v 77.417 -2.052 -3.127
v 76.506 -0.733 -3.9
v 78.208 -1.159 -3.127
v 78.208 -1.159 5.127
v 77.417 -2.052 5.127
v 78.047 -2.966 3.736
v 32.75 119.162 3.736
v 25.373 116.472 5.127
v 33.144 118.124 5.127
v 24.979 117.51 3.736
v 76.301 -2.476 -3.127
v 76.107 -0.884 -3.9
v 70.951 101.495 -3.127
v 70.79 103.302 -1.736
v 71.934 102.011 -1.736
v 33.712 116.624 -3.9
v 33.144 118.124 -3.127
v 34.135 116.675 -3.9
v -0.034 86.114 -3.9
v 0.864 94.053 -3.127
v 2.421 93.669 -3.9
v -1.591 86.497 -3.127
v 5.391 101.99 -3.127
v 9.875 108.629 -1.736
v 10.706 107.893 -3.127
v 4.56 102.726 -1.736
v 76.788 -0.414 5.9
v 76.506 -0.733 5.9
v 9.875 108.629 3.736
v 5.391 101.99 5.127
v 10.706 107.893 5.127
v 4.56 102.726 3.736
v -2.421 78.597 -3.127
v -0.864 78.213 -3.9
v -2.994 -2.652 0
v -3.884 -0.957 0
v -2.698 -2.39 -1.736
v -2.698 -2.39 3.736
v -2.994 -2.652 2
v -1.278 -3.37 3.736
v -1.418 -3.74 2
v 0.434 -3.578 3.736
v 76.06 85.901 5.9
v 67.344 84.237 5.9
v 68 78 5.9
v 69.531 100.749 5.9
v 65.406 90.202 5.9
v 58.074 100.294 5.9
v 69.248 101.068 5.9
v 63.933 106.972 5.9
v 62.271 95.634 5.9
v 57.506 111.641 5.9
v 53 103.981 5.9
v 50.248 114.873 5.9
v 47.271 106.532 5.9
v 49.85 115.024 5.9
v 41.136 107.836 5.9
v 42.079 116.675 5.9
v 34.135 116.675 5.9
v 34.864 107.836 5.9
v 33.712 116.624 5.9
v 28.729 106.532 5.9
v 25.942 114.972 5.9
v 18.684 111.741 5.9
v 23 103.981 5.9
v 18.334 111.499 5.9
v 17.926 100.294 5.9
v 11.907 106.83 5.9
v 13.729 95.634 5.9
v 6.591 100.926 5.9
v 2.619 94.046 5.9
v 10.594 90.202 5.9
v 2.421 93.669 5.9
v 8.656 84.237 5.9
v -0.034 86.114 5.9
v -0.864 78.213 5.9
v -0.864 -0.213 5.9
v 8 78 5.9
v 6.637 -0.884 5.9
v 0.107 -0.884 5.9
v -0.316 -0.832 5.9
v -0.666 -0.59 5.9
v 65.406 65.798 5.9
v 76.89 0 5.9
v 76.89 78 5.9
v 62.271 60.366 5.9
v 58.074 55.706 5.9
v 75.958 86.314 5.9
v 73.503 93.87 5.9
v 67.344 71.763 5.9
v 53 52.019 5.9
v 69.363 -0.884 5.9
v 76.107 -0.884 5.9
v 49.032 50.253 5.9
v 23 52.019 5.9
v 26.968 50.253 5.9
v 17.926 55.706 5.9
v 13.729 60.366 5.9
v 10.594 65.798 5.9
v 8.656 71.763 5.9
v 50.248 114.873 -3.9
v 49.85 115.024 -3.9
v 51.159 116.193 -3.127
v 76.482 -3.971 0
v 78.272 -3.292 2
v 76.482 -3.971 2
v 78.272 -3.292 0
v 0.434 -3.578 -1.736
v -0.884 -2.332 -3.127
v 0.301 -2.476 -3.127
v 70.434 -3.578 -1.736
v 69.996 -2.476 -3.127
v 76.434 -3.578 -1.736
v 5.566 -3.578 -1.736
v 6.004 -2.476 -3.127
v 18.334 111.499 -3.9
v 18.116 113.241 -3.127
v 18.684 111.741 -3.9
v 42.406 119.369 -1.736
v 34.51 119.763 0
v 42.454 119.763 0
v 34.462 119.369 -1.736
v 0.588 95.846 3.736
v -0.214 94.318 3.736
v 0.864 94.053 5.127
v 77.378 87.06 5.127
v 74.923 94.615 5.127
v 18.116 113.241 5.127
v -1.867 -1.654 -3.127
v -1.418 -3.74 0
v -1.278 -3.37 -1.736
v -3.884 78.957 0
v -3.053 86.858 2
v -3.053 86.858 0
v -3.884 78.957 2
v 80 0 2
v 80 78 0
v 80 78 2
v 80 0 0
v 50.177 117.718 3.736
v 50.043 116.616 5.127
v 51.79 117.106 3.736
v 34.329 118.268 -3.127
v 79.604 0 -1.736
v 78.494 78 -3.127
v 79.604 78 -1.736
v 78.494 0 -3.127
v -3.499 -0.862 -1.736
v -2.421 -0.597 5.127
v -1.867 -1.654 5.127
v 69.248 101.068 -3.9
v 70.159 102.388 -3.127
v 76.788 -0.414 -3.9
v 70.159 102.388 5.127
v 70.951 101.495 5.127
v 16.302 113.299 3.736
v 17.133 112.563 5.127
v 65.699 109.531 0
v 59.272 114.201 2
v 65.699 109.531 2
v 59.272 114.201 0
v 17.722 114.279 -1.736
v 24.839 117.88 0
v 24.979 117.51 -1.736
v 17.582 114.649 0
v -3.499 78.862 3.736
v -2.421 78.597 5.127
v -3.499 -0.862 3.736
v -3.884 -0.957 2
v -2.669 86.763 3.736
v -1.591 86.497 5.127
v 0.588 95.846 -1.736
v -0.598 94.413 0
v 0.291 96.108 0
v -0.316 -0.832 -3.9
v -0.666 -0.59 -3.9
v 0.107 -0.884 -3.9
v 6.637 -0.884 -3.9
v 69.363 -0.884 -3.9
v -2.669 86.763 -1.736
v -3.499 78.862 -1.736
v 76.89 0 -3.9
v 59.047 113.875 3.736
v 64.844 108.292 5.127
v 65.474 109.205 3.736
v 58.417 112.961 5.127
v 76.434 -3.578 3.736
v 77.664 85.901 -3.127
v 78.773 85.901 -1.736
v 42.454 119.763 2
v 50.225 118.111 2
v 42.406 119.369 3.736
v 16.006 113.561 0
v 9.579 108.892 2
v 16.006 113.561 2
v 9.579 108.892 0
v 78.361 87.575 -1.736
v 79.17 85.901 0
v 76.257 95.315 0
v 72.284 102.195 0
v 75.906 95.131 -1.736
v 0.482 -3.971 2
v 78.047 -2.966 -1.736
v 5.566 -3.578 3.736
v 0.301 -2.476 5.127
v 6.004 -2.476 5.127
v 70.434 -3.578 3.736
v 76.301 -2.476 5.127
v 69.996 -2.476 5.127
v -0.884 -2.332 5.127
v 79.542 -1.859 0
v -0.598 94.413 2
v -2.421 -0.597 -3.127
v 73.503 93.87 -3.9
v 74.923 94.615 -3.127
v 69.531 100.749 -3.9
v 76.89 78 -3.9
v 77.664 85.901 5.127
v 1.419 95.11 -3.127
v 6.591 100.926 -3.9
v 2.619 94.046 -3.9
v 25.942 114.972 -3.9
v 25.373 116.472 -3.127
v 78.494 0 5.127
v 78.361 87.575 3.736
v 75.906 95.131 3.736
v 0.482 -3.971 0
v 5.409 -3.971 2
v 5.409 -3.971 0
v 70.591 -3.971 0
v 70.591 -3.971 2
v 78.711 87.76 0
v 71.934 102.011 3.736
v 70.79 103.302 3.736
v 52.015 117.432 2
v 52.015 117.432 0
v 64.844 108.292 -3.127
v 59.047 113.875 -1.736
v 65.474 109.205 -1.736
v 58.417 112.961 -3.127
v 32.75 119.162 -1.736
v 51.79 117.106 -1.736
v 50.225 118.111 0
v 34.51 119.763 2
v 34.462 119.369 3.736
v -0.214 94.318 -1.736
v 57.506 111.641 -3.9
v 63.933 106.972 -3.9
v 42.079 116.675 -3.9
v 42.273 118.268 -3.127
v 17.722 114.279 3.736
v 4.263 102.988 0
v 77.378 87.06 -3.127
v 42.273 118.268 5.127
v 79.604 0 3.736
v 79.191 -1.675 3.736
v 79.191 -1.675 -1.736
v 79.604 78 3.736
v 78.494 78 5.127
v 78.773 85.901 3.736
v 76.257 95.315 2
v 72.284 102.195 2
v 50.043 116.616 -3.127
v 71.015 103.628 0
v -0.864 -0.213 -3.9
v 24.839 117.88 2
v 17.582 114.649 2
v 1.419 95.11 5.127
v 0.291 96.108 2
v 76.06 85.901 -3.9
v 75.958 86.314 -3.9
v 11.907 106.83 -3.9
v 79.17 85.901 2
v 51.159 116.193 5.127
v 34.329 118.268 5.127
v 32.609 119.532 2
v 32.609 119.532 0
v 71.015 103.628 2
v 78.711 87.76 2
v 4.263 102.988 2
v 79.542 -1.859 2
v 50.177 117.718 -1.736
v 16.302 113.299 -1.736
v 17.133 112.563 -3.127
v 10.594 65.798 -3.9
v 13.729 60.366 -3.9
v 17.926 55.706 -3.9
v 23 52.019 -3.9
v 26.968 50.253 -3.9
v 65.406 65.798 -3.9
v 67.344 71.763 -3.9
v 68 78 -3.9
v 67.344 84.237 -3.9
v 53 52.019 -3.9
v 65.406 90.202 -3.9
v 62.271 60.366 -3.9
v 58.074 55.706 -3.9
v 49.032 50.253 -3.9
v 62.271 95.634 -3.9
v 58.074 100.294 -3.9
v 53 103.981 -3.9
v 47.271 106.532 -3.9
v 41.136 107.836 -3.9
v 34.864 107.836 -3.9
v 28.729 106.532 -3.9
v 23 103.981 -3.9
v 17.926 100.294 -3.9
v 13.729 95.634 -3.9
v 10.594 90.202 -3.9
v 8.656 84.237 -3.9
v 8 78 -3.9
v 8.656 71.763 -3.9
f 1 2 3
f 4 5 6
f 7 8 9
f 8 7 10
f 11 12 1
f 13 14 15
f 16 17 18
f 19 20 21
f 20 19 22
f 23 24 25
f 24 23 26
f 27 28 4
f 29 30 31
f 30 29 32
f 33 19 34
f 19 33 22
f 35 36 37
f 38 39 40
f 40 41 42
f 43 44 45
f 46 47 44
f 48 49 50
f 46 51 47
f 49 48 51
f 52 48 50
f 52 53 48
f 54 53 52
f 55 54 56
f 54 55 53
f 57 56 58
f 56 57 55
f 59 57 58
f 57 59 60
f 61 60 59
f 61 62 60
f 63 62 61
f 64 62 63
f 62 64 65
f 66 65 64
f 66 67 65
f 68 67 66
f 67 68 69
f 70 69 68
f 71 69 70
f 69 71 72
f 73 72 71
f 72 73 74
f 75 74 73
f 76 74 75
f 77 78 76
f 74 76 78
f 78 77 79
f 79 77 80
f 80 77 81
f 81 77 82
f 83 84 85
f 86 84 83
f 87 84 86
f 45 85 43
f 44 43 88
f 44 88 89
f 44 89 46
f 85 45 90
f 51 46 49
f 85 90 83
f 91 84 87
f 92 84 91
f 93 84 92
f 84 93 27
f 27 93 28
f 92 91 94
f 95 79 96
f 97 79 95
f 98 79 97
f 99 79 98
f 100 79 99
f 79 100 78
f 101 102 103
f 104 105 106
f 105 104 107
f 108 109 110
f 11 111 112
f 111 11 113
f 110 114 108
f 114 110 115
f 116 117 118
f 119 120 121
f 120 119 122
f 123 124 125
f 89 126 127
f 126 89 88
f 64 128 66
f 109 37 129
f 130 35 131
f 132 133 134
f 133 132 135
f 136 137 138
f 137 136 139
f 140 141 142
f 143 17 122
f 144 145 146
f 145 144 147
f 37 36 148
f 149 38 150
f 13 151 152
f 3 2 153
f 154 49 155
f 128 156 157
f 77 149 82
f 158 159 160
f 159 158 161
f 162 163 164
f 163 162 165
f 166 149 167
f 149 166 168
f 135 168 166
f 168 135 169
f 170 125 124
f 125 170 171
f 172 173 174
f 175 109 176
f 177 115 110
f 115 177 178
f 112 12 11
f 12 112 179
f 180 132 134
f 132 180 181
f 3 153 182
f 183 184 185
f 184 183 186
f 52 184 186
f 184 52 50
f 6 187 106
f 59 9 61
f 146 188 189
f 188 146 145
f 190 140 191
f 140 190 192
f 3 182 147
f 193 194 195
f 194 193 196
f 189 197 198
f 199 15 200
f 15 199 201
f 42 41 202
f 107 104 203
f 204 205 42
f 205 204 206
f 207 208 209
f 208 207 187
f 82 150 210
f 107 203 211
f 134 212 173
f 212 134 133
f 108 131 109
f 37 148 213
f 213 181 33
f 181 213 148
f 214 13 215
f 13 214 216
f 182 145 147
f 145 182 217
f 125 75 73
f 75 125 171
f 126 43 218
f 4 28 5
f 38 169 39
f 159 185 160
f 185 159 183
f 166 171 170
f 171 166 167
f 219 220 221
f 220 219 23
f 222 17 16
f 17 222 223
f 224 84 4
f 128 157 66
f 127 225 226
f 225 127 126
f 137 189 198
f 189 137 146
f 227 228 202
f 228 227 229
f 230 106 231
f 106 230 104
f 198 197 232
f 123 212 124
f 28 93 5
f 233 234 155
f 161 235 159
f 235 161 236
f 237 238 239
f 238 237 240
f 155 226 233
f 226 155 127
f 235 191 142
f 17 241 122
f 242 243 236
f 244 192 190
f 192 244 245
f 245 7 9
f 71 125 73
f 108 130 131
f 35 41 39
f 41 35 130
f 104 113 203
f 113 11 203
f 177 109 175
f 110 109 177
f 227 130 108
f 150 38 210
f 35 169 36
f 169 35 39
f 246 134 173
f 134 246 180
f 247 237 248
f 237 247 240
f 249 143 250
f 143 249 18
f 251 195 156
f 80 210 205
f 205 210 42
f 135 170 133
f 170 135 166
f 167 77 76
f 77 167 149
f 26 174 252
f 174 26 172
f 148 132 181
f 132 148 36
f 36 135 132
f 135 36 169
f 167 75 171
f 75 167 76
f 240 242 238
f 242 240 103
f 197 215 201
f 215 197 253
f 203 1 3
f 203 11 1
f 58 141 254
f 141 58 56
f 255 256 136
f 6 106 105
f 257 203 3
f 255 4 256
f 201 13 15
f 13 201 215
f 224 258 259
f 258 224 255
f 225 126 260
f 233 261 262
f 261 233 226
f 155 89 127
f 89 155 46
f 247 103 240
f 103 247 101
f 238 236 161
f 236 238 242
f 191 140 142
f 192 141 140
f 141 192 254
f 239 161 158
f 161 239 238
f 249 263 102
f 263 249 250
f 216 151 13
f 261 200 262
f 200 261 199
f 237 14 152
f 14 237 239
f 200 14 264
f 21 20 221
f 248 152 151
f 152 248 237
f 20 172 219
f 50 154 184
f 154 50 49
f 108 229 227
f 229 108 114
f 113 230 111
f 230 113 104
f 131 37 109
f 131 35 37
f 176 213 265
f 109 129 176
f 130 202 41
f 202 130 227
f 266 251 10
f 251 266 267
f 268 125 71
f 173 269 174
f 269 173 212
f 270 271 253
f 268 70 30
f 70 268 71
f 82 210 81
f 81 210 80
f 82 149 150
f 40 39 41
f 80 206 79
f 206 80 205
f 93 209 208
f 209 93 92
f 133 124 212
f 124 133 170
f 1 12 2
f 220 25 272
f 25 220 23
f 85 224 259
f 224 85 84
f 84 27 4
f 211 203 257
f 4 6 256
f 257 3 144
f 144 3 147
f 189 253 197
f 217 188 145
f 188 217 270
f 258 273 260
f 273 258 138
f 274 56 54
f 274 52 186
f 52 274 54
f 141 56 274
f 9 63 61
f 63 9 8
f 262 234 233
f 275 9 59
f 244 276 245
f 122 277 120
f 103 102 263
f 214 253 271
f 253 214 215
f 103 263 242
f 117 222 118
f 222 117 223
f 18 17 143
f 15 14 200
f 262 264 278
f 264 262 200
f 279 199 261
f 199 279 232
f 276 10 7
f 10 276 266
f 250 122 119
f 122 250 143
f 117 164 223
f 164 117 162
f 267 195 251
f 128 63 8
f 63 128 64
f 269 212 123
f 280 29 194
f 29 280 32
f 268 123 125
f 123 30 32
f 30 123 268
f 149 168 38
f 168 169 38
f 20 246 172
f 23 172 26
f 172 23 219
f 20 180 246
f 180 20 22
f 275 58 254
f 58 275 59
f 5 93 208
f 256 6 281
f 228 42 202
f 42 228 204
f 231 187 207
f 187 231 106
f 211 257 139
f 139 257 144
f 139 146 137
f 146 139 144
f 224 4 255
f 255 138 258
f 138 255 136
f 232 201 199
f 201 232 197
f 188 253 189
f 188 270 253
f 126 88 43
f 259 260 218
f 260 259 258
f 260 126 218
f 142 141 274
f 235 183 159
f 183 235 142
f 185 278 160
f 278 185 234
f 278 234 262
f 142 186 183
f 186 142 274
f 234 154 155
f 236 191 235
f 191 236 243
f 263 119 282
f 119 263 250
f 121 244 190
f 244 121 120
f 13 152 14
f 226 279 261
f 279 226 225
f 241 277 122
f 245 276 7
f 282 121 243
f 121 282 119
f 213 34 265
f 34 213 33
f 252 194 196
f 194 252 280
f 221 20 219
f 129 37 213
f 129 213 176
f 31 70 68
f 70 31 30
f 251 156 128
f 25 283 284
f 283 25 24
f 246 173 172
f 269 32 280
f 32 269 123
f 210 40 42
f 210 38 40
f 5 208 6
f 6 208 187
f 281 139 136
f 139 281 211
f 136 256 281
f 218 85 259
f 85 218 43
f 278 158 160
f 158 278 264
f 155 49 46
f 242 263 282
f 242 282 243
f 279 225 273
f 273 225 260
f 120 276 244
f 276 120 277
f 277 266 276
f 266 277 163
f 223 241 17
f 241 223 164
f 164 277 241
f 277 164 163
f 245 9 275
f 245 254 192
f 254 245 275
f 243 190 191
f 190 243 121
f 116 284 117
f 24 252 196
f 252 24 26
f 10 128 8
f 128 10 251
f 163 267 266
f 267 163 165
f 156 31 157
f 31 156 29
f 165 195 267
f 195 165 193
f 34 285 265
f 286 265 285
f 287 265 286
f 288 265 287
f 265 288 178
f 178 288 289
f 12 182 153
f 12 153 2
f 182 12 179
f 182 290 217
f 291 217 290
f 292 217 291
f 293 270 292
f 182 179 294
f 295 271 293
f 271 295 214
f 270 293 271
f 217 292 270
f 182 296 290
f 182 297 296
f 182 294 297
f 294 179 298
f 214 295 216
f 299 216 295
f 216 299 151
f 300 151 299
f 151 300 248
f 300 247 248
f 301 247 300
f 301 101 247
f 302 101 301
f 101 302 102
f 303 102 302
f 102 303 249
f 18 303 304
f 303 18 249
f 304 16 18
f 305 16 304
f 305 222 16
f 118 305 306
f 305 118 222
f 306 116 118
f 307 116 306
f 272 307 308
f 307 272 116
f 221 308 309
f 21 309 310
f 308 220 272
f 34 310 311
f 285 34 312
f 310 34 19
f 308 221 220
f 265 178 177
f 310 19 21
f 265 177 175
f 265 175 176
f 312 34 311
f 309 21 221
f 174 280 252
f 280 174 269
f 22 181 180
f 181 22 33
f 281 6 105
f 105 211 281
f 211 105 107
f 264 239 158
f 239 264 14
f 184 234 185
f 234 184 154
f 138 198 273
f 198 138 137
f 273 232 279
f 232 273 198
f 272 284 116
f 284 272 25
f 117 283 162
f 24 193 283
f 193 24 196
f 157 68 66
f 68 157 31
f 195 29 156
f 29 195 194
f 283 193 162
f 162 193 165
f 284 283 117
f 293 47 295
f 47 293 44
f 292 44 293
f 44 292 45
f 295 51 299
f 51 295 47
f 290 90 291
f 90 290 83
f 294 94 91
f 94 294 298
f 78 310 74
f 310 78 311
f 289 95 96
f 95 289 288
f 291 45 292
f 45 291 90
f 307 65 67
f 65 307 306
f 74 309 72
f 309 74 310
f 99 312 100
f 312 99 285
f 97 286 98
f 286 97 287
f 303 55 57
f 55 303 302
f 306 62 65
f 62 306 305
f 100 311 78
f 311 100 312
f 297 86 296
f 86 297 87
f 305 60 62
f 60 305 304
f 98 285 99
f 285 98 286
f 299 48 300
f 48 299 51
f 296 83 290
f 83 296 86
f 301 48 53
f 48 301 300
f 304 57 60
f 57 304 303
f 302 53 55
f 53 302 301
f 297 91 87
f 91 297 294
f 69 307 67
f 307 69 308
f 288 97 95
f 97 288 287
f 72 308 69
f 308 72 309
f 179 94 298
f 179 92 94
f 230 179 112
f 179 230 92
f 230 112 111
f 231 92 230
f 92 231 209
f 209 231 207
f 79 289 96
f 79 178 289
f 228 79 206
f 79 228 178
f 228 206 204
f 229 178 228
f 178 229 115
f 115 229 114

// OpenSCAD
inner_diameter = 60;
length = 120;
height = 10;

gripper(inner_diameter, length, height);

module gripper(inner_diameter=60, length=120, height=10, rounding=4){
    inner_circle = inner_diameter; // diameter
    width = inner_circle+20-rounding;
    length = length-rounding;
    leg_length = length-width/2;
    h=height-rounding*2;


    difference(){
        minkowski(){
            union(){
                cube([width, leg_length, h]);
                translate([width/2, leg_length, 0]) cylinder(r=width/2, h=h);
            }
            sphere(rounding);
        }
        translate([width/2,leg_length, -1-rounding]){
            cylinder(r=inner_circle/2, h=height+2);
        }
        translate([0,0,-1-rounding])
        linear_extrude(height=height+2){
            polygon([ [5,-1-rounding], [width/2, leg_length], [width-5, -1-rounding]]);
        }
    }
}
